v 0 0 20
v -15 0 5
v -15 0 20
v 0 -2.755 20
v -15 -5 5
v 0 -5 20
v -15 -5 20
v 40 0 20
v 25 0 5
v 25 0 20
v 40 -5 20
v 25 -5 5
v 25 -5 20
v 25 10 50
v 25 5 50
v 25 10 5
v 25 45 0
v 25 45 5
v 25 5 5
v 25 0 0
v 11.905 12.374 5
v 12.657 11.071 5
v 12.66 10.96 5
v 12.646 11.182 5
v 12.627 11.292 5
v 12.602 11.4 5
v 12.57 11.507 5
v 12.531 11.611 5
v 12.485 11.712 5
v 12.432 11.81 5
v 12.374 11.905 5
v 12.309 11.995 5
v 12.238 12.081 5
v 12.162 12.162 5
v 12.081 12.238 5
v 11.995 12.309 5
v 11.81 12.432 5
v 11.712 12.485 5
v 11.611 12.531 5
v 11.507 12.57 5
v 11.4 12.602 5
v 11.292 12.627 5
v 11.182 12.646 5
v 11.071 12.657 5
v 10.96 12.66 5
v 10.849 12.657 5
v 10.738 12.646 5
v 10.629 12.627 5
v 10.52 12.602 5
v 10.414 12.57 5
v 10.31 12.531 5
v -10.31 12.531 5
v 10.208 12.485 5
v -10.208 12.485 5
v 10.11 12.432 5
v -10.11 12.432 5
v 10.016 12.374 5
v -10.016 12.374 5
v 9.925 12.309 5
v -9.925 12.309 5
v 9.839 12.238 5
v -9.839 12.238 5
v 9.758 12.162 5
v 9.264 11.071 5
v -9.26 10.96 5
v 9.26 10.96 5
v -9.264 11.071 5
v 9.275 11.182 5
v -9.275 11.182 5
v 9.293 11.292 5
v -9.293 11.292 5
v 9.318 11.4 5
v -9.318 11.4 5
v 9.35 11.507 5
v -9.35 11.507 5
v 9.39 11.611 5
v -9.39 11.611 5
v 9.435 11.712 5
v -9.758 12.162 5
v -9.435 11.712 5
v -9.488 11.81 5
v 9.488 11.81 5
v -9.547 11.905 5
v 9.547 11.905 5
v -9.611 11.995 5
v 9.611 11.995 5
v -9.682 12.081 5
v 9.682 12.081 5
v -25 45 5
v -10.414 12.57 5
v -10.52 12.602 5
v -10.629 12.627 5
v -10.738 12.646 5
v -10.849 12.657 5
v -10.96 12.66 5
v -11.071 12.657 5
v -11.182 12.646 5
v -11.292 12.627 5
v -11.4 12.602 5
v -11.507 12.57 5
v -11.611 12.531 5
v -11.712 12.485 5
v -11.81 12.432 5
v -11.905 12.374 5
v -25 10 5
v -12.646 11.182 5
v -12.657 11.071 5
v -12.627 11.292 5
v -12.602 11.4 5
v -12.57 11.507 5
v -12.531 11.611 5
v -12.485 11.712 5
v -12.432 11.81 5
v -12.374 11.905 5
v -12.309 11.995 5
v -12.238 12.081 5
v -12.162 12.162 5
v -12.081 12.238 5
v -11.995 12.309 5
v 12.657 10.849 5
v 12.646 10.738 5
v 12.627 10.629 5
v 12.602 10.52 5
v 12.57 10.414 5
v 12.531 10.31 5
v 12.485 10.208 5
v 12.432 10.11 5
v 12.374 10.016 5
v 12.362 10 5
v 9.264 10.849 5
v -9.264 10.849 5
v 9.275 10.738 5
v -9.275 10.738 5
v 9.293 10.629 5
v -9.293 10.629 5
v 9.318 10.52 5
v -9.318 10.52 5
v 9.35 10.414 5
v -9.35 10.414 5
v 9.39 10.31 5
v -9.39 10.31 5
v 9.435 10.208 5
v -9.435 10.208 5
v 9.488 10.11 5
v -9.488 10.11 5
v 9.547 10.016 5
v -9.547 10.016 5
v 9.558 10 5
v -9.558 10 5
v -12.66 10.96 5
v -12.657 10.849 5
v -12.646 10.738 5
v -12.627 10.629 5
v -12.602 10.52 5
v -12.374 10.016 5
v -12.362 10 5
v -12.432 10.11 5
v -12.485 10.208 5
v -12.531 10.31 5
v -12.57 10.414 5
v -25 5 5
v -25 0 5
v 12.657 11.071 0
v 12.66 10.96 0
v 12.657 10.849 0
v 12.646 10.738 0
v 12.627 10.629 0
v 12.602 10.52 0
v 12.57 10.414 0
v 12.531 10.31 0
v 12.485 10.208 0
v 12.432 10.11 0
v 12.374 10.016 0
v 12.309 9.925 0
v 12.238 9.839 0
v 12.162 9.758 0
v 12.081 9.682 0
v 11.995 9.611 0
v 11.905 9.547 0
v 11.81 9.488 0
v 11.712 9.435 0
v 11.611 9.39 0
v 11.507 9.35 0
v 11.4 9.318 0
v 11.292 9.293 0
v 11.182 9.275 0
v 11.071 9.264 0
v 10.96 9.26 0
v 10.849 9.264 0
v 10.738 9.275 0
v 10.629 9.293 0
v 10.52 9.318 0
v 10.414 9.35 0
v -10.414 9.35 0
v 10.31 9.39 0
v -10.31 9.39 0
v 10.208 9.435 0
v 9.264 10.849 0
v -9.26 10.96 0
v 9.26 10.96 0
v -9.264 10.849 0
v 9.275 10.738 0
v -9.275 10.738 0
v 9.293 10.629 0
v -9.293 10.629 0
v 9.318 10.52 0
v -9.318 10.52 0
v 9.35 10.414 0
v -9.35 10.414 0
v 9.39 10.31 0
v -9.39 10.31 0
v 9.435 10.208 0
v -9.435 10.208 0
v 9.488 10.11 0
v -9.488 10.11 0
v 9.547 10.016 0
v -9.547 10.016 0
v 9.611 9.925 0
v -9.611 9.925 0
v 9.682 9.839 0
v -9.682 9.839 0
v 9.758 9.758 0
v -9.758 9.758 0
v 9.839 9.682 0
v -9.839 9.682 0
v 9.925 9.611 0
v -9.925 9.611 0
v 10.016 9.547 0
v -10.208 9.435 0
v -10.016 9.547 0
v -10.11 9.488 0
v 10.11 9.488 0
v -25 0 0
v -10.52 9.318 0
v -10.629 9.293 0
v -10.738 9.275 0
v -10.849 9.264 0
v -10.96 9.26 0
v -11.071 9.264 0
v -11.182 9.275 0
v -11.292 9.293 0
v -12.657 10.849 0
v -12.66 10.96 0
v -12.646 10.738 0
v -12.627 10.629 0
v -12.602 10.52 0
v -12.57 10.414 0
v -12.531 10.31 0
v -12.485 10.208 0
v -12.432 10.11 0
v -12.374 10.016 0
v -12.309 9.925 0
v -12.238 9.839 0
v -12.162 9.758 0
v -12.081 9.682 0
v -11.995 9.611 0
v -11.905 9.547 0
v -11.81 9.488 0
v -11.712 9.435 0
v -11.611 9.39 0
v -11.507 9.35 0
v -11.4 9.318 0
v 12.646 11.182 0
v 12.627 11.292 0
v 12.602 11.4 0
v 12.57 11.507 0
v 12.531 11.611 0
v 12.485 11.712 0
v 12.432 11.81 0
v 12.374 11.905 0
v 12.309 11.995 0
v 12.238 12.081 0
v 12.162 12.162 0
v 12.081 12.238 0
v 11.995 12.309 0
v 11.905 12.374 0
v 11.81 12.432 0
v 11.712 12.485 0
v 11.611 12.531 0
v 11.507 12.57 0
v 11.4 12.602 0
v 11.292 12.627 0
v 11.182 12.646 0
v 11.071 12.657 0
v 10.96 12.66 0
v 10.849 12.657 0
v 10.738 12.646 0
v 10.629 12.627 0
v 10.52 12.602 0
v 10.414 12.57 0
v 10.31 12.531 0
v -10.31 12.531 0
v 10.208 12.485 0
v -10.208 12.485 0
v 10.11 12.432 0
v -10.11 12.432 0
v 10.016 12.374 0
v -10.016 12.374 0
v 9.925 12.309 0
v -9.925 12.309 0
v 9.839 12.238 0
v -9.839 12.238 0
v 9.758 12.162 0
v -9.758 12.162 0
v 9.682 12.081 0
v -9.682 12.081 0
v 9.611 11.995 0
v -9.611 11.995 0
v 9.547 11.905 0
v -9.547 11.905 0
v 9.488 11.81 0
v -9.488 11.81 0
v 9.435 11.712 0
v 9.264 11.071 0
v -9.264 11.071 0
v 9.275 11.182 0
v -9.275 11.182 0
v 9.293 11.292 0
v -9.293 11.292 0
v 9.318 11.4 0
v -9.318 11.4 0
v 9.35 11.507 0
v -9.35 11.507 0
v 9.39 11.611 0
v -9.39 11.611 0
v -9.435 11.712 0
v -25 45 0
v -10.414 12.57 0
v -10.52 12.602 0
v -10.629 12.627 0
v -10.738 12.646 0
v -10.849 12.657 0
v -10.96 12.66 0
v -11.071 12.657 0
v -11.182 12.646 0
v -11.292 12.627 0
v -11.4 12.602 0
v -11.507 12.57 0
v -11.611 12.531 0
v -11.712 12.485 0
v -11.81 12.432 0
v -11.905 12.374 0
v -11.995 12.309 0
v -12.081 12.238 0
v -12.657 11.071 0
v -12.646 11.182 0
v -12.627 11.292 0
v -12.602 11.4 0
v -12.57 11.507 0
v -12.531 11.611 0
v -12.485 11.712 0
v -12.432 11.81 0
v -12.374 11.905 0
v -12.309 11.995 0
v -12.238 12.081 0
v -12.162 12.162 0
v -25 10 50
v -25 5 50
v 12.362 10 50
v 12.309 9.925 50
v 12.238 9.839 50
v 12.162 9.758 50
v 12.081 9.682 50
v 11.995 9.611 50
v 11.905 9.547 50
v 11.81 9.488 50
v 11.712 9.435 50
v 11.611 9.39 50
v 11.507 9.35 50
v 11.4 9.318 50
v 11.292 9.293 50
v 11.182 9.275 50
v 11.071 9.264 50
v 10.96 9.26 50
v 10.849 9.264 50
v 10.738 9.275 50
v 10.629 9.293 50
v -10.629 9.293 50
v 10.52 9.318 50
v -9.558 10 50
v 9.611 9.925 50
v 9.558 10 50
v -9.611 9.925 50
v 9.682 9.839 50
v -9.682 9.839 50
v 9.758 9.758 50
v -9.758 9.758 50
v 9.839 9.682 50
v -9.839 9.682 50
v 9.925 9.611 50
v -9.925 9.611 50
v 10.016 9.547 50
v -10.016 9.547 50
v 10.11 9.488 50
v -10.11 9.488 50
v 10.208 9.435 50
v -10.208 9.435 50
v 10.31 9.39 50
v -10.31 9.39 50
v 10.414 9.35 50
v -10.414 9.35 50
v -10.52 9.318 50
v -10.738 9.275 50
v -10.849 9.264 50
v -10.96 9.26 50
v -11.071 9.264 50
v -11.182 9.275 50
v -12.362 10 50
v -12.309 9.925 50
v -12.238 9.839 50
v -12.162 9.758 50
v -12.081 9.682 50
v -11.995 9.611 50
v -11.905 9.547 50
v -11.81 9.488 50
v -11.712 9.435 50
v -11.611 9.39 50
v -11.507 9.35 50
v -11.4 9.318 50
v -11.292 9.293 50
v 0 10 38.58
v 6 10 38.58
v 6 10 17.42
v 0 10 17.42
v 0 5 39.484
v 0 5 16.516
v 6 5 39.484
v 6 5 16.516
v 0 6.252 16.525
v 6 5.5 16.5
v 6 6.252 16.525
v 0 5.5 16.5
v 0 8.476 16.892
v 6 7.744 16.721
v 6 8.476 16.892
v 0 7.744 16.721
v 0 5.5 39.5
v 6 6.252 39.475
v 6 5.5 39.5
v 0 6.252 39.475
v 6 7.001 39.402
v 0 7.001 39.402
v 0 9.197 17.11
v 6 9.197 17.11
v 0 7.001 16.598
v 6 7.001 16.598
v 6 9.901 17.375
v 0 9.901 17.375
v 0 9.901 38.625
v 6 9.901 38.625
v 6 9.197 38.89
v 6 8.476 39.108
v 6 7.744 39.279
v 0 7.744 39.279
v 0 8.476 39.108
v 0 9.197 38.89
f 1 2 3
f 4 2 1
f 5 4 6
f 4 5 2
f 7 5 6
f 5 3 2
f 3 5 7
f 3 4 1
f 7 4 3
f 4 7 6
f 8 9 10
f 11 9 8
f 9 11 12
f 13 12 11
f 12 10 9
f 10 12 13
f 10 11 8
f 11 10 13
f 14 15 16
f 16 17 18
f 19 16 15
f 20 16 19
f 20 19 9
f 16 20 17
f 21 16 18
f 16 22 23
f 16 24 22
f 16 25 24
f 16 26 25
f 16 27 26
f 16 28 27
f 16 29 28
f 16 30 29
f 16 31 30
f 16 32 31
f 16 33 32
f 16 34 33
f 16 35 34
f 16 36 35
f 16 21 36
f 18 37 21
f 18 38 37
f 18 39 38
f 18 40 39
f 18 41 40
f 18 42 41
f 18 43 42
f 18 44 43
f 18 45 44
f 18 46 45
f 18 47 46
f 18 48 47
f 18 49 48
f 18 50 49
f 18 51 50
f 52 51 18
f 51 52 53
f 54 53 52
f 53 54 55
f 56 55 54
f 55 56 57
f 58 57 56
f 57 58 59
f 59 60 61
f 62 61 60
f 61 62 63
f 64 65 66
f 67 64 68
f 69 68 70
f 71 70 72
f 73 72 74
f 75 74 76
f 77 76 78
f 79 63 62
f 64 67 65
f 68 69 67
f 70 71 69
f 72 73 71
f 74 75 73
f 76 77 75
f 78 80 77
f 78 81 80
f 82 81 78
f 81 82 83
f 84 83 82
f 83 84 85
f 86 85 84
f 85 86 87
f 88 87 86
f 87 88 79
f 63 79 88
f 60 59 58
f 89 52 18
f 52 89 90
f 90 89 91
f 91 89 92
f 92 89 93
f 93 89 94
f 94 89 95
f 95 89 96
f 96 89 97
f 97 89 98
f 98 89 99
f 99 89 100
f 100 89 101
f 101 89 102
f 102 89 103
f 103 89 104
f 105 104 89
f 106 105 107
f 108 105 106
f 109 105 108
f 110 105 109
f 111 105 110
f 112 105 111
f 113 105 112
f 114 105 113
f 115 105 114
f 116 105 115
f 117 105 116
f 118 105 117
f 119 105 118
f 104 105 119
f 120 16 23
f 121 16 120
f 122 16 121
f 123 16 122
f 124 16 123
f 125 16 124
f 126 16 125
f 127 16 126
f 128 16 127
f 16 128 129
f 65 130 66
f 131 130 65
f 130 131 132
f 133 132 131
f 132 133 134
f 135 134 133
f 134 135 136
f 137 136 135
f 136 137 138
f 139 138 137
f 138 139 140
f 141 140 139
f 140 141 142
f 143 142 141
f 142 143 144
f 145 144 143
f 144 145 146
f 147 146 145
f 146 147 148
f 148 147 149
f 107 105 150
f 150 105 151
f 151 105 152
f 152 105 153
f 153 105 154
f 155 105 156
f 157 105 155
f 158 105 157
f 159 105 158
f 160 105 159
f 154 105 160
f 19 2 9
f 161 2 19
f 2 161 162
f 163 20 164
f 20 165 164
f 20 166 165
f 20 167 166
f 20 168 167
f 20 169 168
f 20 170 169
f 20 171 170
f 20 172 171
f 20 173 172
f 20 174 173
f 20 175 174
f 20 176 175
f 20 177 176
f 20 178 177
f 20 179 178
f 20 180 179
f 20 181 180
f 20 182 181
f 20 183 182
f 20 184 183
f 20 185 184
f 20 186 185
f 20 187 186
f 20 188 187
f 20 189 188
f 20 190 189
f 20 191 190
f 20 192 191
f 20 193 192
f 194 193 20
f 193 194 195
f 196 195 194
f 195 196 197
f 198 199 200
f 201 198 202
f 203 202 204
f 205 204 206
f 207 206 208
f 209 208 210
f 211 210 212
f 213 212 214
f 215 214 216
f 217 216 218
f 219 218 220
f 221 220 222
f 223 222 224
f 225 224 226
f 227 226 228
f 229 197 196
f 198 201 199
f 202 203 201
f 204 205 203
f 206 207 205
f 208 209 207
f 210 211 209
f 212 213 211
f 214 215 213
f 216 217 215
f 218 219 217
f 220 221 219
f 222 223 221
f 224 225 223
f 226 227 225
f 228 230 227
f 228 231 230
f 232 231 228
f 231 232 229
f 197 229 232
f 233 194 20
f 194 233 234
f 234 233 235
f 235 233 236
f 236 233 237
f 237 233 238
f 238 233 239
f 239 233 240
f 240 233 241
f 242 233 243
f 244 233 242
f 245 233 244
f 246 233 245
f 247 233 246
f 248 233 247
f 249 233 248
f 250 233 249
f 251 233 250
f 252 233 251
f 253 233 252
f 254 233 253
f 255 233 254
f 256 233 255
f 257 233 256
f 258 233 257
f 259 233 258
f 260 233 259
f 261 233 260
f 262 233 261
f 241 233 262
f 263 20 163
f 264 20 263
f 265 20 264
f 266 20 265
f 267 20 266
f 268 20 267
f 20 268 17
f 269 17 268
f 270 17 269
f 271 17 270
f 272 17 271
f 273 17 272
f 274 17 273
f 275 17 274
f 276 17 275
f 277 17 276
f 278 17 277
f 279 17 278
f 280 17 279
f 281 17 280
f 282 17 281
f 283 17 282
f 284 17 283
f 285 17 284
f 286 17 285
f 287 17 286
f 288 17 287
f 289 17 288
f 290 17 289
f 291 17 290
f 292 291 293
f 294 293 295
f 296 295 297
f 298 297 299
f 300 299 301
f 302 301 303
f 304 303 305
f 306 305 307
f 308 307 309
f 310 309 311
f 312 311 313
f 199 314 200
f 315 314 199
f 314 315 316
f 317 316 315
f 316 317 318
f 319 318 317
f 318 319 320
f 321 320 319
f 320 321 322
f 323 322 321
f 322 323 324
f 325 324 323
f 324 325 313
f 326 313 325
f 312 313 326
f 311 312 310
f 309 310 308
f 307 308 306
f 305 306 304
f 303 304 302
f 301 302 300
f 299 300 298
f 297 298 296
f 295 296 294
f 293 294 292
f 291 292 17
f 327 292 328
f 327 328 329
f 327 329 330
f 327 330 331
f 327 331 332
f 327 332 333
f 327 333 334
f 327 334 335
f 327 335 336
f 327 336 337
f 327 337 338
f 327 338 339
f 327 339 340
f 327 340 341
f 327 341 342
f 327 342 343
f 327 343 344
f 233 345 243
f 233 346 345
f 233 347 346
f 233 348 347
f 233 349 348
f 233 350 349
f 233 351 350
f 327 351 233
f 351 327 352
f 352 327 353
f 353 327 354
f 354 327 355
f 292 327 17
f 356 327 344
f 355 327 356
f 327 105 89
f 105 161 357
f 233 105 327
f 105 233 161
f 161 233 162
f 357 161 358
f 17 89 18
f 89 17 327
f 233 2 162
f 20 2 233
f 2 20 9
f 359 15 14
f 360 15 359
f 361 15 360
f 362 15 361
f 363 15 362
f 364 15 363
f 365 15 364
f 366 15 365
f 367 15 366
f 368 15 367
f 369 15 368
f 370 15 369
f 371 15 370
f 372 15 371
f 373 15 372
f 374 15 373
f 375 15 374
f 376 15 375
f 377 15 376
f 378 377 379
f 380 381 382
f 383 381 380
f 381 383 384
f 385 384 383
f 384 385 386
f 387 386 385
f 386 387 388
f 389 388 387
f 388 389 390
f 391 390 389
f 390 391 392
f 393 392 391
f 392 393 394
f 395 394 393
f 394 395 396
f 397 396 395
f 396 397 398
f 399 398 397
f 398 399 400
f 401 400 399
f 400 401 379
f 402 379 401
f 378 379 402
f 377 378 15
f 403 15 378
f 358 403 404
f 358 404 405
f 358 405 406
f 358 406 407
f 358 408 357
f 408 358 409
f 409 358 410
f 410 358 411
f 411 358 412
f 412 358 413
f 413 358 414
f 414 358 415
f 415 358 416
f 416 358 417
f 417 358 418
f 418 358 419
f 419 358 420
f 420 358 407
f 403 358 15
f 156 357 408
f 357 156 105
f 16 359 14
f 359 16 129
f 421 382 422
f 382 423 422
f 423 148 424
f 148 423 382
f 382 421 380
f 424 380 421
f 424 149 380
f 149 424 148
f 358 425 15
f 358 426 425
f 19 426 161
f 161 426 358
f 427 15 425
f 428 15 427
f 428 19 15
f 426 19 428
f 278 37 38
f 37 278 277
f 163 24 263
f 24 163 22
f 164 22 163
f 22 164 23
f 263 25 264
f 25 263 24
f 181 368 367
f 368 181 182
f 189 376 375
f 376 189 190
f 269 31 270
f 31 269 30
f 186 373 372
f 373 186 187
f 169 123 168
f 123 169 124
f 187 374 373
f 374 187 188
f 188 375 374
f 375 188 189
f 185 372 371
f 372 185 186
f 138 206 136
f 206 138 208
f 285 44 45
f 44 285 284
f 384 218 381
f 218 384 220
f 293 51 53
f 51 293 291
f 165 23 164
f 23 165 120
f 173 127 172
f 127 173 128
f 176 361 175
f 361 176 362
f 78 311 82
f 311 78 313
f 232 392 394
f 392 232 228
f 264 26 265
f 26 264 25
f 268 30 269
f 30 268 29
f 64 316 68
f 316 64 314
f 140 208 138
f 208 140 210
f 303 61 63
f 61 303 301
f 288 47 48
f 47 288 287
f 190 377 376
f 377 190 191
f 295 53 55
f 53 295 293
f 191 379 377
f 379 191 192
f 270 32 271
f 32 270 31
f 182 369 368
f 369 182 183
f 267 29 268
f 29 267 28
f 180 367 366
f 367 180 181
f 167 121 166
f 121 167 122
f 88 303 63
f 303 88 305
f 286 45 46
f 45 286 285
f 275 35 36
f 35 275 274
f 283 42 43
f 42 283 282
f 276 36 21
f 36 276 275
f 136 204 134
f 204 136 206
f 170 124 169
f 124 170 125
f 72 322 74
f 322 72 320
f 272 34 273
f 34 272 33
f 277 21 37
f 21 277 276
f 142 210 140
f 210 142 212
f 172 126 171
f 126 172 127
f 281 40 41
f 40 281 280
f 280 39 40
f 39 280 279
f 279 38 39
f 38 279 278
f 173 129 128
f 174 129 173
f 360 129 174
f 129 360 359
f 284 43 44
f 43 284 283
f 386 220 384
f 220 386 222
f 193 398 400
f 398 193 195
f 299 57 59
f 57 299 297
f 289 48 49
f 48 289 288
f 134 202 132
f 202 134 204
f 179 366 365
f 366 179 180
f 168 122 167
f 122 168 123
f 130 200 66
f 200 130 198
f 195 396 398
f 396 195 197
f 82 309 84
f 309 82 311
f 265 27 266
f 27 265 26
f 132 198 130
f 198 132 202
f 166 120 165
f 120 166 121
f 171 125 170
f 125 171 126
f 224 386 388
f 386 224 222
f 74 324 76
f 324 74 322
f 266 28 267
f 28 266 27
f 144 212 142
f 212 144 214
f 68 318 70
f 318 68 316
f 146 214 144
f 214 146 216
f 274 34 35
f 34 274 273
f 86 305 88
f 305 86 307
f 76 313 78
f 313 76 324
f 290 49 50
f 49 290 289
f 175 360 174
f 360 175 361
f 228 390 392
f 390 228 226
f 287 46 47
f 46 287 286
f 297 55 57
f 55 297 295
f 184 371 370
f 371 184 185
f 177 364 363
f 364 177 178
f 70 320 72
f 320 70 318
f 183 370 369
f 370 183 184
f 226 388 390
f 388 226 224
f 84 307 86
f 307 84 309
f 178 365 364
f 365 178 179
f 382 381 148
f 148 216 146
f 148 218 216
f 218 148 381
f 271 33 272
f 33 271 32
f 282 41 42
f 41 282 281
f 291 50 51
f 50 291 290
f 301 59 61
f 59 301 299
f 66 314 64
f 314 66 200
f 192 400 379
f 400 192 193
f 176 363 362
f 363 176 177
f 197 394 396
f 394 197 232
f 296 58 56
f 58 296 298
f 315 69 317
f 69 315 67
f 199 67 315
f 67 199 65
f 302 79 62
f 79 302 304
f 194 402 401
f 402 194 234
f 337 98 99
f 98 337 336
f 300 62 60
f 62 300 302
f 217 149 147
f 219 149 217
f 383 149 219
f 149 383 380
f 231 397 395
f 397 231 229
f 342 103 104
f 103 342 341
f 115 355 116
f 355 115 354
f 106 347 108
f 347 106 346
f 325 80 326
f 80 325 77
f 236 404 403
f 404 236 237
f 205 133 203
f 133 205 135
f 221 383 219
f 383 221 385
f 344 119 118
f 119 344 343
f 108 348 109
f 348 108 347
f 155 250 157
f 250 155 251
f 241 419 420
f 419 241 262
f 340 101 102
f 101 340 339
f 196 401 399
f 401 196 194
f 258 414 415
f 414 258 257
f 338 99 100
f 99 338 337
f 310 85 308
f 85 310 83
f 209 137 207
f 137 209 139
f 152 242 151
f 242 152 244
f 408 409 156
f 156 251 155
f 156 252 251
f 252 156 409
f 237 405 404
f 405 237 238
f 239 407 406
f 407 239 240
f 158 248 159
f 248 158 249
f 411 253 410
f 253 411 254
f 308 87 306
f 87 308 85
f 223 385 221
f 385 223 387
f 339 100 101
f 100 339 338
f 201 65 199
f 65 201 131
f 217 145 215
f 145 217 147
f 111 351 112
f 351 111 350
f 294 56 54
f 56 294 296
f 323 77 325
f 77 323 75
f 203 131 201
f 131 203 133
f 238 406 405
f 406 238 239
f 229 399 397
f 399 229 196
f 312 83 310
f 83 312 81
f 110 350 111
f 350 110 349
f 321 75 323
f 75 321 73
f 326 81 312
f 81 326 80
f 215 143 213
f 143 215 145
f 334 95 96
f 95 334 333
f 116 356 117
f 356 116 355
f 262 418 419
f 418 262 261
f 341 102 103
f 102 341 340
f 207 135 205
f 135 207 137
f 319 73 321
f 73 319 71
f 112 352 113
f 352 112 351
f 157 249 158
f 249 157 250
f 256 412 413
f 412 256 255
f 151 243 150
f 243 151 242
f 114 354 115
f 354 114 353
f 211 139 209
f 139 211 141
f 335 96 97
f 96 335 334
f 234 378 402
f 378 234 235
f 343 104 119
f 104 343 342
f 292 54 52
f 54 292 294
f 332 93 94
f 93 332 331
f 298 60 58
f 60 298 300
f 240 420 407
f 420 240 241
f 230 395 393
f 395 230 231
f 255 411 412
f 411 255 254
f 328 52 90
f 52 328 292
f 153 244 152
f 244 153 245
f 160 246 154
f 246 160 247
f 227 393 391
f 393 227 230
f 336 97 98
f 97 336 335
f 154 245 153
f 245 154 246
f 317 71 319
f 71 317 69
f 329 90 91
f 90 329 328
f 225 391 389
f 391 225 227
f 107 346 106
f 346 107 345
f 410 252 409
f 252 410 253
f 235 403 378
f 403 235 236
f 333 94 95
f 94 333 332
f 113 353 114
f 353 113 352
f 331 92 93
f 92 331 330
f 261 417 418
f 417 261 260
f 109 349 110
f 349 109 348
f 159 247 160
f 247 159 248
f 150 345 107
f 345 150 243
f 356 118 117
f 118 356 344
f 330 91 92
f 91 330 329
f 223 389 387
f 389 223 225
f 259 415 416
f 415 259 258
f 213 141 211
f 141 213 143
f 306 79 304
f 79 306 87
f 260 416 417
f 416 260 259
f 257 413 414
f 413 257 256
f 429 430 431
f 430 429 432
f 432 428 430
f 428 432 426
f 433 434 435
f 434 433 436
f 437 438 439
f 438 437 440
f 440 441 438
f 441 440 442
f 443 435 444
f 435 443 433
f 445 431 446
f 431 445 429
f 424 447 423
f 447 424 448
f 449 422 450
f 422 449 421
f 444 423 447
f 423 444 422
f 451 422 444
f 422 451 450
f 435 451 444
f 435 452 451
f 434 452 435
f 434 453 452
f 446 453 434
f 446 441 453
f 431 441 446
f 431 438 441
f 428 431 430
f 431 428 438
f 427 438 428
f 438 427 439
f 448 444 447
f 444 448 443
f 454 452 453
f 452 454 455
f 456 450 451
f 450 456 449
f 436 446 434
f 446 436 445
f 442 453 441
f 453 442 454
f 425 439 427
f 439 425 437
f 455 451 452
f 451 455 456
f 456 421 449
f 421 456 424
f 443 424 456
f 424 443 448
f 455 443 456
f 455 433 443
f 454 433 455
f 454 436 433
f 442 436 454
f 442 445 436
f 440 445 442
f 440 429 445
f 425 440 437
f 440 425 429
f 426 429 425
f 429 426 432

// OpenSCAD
// L-shaped mounting bracket for a NEMA 17 stepper motor (e.g., syringe pump)
// Print orientation: base plate lies on the bed (z = 0), motor plate builds upward.

// ---------------- Parameters ----------------
base_x      = 25;    // base plate half-width (X: -25 to 25)
base_y      = 45;    // base plate length (Y: 0 to 45)
base_t      = 5;     // base plate thickness (Z: 0 to 5)

motor_h     = 50;    // motor plate height (Z: 0 to 50)
motor_w     = 5;     // motor plate thickness (Y: 0 to 5)

boss_d      = 23;    // motor centring-boss hole diameter
boss_x      = 0;     // hole centre X
boss_z      = 28;    // hole centre Z

screw_d     = 3.4;   // M3 screw hole diameter
screw_s     = 31;    // square pattern side length
screw_n     = 4;     // number of screw holes

gusset_t    = 5;     // gusset thickness (X direction)
gusset_y    = 20;    // gusset leg along +Y (from y = 5)
gusset_z    = 20;    // gusset leg along +Z (from z = 5)

eps         = 0.5;   // cutter overshoot past faces

$fn = 96;            // curve resolution

// ---------------- Model ----------------
difference() {
    // --- Bodies ---
    union() {
        // Base plate
        translate([-base_x, 0, 0])
            cube([2 * base_x, base_y, base_t]);

        // Motor plate (standing on the back edge of the base)
        translate([-base_x, motor_w, 0])
            cube([2 * base_x, motor_w, motor_h]);

        // Triangular gussets, flush with the left and right edges
        // Right triangle in YZ: legs 20 mm along +Y and +Z, right angle at (y = 5, z = 5)
        for (sx = [-1, 1])
            translate([sx * (base_x - gusset_t), 0, 0])
                rotate([90, 0, 0])
                    linear_extrude(height = gusset_t)
                        polygon([[gusset_y, gusset_z], [5, gusset_z], [5, 5]]);
    }

    // --- Cutouts ---
    // Motor-boss hole, through along Y, centred at x = 0, z = 28
    translate([boss_x, motor_w + eps, boss_z])
        rotate([0, 90, 0])
            cylinder(d = boss_d, h = motor_w + 2 * eps);

    // Four M3 screw holes on a 31 mm square pattern, centred on the boss hole
    for (i = [0 : screw_n - 1]) {
        a = 45 + i * 90;
        r = screw_s / 2;
        translate([r * cos(a), r * sin(a), -eps])
            cylinder(d = screw_d, h = motor_h + 2 * eps);
    }
}
